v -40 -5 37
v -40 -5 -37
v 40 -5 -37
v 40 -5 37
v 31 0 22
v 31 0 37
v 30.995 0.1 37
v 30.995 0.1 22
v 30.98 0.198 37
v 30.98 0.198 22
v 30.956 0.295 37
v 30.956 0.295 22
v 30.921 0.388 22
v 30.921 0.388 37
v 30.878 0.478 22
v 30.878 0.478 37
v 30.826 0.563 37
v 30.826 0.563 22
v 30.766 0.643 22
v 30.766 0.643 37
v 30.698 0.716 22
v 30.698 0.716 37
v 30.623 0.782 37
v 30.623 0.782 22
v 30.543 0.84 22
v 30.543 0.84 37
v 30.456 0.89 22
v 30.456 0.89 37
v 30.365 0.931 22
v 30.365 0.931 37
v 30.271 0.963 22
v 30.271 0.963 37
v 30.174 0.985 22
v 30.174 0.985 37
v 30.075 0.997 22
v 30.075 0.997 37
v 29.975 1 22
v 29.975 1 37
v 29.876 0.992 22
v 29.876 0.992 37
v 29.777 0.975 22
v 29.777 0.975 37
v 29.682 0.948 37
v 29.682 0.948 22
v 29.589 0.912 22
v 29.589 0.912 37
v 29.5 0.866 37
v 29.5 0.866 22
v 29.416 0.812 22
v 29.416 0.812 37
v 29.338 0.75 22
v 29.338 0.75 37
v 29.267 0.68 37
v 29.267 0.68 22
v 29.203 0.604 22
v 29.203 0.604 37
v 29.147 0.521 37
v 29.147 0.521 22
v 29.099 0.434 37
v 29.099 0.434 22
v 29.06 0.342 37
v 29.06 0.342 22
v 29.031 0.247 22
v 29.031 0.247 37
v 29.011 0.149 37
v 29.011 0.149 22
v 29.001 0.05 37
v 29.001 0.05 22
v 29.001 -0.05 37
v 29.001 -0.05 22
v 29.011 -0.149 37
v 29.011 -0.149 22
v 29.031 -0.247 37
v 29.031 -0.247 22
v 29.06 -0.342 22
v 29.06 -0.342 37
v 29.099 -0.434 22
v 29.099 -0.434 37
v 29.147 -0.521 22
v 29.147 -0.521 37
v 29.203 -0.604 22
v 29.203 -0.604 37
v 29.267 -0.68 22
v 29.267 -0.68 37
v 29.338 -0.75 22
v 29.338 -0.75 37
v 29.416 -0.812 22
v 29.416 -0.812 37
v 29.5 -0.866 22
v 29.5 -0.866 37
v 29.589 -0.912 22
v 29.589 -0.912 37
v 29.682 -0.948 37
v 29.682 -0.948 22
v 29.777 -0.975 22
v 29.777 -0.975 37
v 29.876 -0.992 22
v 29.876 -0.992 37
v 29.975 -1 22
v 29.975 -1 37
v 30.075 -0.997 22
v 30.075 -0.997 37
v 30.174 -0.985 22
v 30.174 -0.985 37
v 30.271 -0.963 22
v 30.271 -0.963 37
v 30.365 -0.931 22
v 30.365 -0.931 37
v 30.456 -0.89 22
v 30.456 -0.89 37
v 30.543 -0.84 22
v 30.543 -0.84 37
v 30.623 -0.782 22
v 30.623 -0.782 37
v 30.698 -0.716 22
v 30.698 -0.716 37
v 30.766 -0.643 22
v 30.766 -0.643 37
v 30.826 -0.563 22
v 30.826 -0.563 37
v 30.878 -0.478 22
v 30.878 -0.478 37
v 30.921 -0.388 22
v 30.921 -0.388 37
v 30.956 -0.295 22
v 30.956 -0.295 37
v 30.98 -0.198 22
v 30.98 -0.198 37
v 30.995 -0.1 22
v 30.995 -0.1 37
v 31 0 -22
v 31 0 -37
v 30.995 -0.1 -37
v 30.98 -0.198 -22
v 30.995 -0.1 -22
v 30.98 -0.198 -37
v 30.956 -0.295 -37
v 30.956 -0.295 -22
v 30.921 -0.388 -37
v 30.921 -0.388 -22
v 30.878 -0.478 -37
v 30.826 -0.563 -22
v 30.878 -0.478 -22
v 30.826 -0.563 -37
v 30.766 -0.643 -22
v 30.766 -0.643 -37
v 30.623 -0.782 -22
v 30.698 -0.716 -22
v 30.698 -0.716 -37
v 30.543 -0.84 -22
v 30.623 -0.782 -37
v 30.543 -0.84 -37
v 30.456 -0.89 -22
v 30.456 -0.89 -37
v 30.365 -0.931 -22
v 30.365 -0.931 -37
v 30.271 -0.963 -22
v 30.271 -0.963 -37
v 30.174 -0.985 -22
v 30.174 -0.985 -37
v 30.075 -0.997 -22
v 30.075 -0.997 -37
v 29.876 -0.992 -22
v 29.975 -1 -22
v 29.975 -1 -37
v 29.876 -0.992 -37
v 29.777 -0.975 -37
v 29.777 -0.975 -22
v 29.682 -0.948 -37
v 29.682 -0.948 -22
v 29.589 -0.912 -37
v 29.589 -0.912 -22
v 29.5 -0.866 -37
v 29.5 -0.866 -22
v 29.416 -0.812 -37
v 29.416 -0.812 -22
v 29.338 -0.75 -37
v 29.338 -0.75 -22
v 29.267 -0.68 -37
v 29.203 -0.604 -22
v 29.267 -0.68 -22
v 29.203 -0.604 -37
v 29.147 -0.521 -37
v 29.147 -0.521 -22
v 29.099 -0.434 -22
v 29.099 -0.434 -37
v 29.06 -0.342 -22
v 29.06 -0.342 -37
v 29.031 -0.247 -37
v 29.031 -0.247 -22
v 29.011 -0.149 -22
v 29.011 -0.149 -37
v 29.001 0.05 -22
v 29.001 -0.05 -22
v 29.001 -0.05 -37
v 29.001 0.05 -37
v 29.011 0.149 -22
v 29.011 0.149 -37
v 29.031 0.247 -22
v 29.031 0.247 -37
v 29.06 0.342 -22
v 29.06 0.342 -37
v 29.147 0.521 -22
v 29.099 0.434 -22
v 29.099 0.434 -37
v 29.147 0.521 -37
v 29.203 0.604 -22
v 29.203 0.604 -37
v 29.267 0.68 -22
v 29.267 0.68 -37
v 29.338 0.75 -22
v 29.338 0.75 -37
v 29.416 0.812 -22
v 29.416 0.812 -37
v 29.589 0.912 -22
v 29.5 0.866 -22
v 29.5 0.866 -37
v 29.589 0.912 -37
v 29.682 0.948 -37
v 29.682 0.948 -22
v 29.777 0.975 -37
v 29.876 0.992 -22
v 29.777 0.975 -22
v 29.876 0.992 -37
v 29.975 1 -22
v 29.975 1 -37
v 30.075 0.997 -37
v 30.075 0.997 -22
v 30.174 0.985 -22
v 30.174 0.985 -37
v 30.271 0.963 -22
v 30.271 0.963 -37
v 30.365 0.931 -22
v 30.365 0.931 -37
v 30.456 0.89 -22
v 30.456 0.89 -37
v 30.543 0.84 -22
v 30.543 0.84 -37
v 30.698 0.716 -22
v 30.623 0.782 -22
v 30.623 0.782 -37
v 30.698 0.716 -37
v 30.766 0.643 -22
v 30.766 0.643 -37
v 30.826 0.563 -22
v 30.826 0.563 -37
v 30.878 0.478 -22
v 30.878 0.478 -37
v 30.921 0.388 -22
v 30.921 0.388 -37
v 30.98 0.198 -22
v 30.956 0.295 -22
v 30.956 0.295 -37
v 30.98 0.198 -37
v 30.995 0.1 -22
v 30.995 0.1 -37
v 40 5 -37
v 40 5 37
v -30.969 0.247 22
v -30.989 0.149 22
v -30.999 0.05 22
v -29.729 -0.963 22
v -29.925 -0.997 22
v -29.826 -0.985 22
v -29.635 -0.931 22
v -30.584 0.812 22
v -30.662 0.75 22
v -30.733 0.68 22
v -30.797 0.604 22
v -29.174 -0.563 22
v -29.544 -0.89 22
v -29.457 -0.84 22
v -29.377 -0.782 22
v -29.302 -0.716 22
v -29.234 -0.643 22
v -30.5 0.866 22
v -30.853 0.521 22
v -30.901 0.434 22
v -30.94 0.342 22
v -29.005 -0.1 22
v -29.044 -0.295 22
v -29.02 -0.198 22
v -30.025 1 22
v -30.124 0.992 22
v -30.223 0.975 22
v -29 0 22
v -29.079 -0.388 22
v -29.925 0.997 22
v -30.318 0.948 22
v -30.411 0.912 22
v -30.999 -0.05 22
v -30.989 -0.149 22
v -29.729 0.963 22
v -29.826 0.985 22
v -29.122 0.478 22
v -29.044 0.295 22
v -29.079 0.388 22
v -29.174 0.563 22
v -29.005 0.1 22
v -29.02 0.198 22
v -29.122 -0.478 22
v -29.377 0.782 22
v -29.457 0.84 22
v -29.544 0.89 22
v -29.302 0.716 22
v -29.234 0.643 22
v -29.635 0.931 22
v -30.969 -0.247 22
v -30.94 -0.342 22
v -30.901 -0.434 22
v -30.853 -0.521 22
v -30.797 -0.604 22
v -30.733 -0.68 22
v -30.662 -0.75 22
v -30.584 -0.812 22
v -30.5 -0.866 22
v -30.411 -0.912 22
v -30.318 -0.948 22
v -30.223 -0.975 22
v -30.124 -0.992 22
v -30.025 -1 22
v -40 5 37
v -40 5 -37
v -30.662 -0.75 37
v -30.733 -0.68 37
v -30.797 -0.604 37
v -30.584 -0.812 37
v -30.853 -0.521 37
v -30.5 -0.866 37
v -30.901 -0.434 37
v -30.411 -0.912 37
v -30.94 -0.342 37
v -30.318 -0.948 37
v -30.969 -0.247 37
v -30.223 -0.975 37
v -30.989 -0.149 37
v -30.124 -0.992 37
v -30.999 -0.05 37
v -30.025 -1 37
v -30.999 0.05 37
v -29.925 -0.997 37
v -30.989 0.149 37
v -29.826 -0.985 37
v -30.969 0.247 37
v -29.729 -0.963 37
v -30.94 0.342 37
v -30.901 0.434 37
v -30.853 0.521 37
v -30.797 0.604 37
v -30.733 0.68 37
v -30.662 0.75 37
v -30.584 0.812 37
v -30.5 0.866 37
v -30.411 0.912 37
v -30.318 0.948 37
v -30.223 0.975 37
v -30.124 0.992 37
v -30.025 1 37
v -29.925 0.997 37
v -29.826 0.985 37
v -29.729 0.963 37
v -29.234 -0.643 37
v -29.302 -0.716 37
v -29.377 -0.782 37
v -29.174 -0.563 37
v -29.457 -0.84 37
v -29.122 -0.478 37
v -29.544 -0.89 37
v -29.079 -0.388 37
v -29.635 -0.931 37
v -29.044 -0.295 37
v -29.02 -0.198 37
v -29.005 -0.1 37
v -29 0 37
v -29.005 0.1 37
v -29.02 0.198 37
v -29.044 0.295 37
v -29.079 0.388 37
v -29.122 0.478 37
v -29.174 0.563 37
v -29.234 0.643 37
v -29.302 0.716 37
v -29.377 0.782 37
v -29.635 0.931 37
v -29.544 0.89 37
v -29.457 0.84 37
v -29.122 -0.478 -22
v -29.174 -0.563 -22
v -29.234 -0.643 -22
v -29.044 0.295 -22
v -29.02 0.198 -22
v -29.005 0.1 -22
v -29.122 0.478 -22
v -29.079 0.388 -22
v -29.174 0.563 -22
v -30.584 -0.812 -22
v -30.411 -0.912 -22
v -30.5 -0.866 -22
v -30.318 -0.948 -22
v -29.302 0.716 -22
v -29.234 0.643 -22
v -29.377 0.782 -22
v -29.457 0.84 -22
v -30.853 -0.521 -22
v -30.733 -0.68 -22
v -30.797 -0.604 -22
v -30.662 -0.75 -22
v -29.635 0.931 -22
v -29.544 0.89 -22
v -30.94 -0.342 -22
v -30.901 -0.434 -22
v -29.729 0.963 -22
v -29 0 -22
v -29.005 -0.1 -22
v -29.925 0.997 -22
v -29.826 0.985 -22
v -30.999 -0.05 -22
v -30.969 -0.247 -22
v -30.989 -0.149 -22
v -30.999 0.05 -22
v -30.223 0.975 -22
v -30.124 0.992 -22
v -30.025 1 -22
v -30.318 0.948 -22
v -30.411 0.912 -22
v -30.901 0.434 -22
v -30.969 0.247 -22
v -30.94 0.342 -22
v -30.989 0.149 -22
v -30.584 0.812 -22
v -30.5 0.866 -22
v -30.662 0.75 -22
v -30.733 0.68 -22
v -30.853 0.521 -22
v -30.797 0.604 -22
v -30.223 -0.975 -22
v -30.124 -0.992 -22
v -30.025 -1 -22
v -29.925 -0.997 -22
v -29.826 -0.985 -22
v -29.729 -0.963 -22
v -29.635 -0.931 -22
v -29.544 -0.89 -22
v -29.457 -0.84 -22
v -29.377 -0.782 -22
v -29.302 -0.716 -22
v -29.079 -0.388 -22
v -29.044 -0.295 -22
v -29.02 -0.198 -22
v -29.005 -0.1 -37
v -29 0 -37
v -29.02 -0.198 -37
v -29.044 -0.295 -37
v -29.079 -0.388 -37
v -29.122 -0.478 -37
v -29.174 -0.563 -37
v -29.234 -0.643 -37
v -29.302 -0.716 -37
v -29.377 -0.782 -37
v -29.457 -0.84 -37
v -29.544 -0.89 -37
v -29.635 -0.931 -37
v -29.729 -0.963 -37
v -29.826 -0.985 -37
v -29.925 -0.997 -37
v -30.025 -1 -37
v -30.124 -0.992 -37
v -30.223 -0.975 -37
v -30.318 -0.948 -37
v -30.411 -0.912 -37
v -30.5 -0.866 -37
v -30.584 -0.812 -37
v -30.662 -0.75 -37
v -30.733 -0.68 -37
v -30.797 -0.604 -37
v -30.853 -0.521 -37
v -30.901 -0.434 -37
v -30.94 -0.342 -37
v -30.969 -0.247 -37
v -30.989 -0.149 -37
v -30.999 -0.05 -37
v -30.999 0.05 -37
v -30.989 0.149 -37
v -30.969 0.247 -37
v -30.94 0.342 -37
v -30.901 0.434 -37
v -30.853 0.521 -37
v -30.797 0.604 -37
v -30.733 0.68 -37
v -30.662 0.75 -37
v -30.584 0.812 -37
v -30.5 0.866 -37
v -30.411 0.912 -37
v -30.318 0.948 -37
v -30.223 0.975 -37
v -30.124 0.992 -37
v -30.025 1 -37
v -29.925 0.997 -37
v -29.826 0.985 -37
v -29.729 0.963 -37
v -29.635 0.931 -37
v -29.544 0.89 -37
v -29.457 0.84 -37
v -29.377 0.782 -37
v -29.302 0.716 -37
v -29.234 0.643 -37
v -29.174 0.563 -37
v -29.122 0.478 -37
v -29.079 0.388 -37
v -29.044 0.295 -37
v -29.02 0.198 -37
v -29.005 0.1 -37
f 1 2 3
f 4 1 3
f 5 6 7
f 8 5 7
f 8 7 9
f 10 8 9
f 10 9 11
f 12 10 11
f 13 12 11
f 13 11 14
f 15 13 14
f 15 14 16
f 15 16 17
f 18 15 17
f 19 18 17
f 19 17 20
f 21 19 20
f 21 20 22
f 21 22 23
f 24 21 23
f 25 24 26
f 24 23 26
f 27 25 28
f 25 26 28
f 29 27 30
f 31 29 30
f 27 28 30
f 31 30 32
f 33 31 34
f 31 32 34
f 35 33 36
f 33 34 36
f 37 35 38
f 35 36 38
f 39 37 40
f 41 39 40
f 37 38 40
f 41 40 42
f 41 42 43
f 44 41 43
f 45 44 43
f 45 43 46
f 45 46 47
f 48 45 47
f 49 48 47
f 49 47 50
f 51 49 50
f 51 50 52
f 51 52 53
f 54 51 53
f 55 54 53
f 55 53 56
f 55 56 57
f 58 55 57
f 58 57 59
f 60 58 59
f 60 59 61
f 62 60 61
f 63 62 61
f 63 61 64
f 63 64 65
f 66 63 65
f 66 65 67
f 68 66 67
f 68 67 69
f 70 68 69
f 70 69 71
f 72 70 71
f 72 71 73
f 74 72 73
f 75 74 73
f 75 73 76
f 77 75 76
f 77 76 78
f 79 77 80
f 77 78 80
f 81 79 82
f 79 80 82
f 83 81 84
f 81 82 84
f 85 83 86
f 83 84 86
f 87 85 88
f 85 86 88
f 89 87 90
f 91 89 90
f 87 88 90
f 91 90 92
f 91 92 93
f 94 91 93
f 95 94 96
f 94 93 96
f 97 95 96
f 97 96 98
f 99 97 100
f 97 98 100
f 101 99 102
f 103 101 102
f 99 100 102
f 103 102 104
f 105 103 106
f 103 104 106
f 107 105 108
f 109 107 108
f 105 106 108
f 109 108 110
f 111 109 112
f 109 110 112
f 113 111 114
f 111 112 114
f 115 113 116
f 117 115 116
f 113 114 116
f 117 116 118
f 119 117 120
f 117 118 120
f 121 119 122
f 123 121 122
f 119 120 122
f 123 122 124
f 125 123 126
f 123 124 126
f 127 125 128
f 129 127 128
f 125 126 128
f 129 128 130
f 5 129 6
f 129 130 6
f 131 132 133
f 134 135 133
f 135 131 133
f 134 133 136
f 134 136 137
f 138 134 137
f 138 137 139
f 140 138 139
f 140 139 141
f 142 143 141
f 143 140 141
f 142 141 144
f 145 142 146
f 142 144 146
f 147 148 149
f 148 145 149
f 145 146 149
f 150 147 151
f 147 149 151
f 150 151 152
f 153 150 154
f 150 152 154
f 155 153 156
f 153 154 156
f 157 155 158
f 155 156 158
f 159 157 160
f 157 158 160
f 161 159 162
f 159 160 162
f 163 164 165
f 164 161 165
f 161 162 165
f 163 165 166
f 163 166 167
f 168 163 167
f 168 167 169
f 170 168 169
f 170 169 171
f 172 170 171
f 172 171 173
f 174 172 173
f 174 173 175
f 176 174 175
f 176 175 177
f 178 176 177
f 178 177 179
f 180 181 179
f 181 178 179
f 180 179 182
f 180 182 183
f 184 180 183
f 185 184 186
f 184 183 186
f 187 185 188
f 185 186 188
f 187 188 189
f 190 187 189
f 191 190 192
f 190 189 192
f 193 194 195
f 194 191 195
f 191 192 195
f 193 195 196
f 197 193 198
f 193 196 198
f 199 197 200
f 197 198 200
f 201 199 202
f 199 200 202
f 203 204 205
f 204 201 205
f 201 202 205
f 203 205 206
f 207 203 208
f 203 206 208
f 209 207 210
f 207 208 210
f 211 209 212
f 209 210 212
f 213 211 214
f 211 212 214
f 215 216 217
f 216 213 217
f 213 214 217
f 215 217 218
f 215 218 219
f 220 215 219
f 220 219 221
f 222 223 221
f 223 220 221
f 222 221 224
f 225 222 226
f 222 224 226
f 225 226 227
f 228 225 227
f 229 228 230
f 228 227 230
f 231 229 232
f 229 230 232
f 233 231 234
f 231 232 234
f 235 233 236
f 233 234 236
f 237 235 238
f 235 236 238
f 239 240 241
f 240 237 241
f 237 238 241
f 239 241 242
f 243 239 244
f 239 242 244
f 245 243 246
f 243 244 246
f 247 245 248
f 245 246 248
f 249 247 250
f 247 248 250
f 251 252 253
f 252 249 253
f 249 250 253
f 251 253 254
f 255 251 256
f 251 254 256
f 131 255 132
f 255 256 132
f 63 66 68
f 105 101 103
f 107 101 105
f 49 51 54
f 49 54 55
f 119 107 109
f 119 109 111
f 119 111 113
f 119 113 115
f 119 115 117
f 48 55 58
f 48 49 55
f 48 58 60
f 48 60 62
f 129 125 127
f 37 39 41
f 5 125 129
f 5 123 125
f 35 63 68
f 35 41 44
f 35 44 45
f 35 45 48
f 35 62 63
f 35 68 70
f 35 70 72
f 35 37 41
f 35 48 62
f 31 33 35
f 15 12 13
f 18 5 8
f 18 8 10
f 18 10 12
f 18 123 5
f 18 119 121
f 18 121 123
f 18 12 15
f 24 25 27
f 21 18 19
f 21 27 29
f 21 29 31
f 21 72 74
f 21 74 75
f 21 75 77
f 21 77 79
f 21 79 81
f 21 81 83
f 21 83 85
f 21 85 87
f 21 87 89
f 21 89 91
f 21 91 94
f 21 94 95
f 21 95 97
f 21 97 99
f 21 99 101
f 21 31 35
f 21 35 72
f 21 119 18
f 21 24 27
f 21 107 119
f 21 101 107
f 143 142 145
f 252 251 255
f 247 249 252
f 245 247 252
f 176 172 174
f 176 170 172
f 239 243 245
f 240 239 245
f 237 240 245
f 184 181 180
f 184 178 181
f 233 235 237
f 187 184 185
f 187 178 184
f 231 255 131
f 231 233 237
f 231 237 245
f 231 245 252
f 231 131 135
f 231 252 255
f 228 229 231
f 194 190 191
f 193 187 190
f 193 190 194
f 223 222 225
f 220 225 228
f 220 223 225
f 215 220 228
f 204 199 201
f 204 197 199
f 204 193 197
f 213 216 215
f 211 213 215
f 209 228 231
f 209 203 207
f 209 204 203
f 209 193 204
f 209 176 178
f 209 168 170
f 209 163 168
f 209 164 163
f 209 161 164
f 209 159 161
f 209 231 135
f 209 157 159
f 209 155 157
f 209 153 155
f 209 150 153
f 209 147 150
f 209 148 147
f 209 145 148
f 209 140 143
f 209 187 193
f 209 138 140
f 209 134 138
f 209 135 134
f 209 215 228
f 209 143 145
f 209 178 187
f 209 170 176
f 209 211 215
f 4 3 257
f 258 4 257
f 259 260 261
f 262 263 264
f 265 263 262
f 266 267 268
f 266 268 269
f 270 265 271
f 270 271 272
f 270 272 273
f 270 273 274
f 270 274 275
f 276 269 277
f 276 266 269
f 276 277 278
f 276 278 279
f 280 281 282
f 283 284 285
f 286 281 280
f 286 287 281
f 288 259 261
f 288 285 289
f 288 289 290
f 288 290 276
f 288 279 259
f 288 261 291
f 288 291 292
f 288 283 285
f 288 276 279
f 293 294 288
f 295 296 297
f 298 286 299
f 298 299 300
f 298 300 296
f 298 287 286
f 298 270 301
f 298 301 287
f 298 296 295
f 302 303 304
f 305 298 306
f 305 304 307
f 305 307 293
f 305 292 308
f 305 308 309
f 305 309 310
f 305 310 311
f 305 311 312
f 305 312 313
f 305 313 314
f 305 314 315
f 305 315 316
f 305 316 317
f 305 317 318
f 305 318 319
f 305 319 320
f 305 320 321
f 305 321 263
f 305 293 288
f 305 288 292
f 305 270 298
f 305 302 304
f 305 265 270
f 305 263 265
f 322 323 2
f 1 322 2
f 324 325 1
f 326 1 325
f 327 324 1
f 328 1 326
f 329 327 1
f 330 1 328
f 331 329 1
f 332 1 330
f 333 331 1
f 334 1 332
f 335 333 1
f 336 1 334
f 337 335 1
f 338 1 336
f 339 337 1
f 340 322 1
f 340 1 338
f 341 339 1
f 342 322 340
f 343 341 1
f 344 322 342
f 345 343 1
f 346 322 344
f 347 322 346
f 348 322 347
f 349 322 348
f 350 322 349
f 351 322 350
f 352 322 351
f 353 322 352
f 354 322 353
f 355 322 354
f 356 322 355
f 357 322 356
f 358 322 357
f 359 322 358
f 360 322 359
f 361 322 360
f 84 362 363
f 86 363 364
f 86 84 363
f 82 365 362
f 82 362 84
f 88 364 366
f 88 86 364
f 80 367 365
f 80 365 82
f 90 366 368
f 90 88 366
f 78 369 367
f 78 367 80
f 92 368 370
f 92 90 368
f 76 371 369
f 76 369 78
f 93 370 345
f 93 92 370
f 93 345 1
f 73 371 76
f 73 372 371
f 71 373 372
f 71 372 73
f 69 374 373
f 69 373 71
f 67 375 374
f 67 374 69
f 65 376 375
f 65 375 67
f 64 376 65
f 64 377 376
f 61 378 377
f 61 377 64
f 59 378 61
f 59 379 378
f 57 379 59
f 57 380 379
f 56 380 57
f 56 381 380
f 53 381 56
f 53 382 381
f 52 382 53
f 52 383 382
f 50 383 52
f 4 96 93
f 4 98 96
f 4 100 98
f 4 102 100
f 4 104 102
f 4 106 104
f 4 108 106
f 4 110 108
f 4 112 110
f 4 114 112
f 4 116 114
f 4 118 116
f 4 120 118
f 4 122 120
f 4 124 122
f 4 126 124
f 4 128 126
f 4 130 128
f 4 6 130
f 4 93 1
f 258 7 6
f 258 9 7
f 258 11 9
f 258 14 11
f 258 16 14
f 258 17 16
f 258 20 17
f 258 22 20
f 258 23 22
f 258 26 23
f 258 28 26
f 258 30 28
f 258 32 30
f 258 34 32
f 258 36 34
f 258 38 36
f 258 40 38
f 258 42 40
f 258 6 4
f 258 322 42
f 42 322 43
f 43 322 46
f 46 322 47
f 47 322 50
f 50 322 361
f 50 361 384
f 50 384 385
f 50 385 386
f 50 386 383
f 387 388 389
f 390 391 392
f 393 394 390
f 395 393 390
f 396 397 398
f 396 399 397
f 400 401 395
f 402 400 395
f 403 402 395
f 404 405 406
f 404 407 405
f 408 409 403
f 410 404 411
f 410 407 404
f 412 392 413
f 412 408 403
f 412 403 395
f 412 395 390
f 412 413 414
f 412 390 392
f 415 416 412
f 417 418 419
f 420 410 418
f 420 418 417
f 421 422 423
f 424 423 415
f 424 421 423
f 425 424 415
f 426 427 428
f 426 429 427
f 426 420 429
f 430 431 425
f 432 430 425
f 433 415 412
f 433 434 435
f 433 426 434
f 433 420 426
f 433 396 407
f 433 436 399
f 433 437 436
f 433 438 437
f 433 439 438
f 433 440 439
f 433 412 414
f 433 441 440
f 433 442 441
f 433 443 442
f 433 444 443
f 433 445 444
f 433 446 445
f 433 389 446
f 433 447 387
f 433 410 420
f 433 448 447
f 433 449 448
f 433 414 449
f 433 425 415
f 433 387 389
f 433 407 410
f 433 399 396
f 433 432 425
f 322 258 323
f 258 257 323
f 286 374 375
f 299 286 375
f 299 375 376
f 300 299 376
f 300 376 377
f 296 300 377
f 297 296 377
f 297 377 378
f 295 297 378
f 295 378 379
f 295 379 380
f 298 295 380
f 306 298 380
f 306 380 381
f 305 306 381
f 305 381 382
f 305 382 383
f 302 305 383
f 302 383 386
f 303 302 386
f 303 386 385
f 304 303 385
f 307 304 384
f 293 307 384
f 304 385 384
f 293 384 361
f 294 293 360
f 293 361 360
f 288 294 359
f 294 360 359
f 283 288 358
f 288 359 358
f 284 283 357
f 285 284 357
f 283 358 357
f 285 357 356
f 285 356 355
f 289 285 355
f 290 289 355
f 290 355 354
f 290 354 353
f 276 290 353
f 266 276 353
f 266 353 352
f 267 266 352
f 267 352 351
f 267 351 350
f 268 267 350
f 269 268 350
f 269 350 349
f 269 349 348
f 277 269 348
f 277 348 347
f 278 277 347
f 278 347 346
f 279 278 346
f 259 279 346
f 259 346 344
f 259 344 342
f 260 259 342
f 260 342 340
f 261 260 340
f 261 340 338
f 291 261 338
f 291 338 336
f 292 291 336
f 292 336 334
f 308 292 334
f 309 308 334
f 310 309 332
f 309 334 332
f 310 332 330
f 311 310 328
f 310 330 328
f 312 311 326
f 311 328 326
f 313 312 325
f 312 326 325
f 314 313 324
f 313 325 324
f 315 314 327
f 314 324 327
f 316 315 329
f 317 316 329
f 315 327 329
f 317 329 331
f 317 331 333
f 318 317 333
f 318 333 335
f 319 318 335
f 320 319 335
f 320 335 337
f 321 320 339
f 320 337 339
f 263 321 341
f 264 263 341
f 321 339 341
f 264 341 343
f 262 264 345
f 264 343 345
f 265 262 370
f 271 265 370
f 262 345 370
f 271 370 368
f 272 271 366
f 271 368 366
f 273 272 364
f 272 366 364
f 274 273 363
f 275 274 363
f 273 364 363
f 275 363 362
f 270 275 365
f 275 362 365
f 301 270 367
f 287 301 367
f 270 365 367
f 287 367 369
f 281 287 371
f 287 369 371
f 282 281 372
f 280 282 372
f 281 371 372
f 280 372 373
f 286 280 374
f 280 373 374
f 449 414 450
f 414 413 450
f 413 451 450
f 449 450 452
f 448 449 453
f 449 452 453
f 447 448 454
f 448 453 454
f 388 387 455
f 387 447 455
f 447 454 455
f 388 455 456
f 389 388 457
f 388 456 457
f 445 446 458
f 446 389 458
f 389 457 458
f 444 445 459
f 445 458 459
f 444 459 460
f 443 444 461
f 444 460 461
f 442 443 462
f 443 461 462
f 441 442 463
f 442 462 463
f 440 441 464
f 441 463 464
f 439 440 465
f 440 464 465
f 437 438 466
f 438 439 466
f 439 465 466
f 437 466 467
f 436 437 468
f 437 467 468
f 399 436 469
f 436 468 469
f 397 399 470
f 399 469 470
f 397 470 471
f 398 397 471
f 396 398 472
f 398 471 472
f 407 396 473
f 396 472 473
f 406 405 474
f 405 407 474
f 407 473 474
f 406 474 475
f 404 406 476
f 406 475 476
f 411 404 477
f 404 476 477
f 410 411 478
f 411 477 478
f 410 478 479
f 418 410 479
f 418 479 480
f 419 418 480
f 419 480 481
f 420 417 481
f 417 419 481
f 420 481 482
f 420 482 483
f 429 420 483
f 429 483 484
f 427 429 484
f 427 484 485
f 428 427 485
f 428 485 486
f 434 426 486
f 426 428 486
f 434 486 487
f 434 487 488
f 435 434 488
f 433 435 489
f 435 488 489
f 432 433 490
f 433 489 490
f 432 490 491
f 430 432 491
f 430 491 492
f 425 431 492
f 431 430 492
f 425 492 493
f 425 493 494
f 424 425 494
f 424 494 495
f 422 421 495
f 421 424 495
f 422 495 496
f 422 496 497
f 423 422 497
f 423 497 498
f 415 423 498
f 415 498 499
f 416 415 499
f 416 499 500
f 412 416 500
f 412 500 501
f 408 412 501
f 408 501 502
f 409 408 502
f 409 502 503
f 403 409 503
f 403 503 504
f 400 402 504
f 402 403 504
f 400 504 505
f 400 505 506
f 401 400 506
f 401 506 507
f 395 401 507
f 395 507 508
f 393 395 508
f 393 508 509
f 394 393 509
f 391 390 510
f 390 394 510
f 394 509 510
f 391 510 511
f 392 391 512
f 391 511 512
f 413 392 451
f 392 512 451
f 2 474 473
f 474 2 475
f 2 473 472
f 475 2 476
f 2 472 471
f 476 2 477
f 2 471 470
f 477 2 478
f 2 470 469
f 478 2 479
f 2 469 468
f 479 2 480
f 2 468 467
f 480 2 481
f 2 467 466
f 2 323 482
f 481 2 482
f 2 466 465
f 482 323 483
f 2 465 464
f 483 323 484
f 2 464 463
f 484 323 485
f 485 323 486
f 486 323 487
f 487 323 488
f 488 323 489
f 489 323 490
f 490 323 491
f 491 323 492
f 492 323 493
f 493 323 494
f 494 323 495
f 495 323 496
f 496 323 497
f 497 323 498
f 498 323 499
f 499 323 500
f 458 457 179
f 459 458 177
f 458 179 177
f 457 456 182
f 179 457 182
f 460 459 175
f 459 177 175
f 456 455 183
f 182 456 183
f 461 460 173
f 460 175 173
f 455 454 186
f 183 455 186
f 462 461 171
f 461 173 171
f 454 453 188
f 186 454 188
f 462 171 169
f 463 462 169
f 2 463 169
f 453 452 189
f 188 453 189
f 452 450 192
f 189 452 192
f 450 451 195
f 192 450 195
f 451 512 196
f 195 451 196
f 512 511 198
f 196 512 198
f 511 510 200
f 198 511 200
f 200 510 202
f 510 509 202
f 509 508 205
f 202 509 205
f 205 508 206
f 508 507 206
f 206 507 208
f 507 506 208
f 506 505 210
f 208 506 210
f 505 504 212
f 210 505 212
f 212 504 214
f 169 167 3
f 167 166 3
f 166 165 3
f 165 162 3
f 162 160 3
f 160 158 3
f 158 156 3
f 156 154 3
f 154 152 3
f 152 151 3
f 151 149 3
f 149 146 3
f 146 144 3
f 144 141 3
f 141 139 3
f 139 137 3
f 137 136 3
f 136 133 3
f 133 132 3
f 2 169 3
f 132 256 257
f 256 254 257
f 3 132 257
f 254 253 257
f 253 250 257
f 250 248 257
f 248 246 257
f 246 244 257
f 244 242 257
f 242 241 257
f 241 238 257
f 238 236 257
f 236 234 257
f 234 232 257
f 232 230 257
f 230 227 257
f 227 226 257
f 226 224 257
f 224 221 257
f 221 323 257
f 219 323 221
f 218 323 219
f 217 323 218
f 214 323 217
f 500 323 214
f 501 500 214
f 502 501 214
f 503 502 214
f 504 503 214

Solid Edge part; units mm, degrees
sketch "Sketch1" plane through (0, 0, 0) normal (0, 0, 1) x (1, 0, 0)
  line L0 (-40, -5) -> (40, -5)
  line L1 (40, -5) -> (40, 5)
  line L2 (40, 5) -> (-40, 5)
  line L3 (-40, 5) -> (-40, -5)
  dimension "D1" = 80
  dimension "D2" = 10
extrude "Protrusion1" add sketch "Sketch1" along normal mid plane 74
sketch "Sketch2" plane through (0, 0, 37) normal (0, 0, 1) x (1, 0, 0)
  circle A0 centre (-30, 0) radius 1
  circle A1 centre (30, 0) radius 1
  dimension "D1" = 60
  dimension "D2" = 2
extrude "Extrusionsausschnitt_1" cut sketch "Sketch2" against normal blind 15
mirror "Mirror1" about plane through (0, 0, 0) normal (0, 0, 1) of "Extrusionsausschnitt_1"
properties material "Nylon, allgemein"
